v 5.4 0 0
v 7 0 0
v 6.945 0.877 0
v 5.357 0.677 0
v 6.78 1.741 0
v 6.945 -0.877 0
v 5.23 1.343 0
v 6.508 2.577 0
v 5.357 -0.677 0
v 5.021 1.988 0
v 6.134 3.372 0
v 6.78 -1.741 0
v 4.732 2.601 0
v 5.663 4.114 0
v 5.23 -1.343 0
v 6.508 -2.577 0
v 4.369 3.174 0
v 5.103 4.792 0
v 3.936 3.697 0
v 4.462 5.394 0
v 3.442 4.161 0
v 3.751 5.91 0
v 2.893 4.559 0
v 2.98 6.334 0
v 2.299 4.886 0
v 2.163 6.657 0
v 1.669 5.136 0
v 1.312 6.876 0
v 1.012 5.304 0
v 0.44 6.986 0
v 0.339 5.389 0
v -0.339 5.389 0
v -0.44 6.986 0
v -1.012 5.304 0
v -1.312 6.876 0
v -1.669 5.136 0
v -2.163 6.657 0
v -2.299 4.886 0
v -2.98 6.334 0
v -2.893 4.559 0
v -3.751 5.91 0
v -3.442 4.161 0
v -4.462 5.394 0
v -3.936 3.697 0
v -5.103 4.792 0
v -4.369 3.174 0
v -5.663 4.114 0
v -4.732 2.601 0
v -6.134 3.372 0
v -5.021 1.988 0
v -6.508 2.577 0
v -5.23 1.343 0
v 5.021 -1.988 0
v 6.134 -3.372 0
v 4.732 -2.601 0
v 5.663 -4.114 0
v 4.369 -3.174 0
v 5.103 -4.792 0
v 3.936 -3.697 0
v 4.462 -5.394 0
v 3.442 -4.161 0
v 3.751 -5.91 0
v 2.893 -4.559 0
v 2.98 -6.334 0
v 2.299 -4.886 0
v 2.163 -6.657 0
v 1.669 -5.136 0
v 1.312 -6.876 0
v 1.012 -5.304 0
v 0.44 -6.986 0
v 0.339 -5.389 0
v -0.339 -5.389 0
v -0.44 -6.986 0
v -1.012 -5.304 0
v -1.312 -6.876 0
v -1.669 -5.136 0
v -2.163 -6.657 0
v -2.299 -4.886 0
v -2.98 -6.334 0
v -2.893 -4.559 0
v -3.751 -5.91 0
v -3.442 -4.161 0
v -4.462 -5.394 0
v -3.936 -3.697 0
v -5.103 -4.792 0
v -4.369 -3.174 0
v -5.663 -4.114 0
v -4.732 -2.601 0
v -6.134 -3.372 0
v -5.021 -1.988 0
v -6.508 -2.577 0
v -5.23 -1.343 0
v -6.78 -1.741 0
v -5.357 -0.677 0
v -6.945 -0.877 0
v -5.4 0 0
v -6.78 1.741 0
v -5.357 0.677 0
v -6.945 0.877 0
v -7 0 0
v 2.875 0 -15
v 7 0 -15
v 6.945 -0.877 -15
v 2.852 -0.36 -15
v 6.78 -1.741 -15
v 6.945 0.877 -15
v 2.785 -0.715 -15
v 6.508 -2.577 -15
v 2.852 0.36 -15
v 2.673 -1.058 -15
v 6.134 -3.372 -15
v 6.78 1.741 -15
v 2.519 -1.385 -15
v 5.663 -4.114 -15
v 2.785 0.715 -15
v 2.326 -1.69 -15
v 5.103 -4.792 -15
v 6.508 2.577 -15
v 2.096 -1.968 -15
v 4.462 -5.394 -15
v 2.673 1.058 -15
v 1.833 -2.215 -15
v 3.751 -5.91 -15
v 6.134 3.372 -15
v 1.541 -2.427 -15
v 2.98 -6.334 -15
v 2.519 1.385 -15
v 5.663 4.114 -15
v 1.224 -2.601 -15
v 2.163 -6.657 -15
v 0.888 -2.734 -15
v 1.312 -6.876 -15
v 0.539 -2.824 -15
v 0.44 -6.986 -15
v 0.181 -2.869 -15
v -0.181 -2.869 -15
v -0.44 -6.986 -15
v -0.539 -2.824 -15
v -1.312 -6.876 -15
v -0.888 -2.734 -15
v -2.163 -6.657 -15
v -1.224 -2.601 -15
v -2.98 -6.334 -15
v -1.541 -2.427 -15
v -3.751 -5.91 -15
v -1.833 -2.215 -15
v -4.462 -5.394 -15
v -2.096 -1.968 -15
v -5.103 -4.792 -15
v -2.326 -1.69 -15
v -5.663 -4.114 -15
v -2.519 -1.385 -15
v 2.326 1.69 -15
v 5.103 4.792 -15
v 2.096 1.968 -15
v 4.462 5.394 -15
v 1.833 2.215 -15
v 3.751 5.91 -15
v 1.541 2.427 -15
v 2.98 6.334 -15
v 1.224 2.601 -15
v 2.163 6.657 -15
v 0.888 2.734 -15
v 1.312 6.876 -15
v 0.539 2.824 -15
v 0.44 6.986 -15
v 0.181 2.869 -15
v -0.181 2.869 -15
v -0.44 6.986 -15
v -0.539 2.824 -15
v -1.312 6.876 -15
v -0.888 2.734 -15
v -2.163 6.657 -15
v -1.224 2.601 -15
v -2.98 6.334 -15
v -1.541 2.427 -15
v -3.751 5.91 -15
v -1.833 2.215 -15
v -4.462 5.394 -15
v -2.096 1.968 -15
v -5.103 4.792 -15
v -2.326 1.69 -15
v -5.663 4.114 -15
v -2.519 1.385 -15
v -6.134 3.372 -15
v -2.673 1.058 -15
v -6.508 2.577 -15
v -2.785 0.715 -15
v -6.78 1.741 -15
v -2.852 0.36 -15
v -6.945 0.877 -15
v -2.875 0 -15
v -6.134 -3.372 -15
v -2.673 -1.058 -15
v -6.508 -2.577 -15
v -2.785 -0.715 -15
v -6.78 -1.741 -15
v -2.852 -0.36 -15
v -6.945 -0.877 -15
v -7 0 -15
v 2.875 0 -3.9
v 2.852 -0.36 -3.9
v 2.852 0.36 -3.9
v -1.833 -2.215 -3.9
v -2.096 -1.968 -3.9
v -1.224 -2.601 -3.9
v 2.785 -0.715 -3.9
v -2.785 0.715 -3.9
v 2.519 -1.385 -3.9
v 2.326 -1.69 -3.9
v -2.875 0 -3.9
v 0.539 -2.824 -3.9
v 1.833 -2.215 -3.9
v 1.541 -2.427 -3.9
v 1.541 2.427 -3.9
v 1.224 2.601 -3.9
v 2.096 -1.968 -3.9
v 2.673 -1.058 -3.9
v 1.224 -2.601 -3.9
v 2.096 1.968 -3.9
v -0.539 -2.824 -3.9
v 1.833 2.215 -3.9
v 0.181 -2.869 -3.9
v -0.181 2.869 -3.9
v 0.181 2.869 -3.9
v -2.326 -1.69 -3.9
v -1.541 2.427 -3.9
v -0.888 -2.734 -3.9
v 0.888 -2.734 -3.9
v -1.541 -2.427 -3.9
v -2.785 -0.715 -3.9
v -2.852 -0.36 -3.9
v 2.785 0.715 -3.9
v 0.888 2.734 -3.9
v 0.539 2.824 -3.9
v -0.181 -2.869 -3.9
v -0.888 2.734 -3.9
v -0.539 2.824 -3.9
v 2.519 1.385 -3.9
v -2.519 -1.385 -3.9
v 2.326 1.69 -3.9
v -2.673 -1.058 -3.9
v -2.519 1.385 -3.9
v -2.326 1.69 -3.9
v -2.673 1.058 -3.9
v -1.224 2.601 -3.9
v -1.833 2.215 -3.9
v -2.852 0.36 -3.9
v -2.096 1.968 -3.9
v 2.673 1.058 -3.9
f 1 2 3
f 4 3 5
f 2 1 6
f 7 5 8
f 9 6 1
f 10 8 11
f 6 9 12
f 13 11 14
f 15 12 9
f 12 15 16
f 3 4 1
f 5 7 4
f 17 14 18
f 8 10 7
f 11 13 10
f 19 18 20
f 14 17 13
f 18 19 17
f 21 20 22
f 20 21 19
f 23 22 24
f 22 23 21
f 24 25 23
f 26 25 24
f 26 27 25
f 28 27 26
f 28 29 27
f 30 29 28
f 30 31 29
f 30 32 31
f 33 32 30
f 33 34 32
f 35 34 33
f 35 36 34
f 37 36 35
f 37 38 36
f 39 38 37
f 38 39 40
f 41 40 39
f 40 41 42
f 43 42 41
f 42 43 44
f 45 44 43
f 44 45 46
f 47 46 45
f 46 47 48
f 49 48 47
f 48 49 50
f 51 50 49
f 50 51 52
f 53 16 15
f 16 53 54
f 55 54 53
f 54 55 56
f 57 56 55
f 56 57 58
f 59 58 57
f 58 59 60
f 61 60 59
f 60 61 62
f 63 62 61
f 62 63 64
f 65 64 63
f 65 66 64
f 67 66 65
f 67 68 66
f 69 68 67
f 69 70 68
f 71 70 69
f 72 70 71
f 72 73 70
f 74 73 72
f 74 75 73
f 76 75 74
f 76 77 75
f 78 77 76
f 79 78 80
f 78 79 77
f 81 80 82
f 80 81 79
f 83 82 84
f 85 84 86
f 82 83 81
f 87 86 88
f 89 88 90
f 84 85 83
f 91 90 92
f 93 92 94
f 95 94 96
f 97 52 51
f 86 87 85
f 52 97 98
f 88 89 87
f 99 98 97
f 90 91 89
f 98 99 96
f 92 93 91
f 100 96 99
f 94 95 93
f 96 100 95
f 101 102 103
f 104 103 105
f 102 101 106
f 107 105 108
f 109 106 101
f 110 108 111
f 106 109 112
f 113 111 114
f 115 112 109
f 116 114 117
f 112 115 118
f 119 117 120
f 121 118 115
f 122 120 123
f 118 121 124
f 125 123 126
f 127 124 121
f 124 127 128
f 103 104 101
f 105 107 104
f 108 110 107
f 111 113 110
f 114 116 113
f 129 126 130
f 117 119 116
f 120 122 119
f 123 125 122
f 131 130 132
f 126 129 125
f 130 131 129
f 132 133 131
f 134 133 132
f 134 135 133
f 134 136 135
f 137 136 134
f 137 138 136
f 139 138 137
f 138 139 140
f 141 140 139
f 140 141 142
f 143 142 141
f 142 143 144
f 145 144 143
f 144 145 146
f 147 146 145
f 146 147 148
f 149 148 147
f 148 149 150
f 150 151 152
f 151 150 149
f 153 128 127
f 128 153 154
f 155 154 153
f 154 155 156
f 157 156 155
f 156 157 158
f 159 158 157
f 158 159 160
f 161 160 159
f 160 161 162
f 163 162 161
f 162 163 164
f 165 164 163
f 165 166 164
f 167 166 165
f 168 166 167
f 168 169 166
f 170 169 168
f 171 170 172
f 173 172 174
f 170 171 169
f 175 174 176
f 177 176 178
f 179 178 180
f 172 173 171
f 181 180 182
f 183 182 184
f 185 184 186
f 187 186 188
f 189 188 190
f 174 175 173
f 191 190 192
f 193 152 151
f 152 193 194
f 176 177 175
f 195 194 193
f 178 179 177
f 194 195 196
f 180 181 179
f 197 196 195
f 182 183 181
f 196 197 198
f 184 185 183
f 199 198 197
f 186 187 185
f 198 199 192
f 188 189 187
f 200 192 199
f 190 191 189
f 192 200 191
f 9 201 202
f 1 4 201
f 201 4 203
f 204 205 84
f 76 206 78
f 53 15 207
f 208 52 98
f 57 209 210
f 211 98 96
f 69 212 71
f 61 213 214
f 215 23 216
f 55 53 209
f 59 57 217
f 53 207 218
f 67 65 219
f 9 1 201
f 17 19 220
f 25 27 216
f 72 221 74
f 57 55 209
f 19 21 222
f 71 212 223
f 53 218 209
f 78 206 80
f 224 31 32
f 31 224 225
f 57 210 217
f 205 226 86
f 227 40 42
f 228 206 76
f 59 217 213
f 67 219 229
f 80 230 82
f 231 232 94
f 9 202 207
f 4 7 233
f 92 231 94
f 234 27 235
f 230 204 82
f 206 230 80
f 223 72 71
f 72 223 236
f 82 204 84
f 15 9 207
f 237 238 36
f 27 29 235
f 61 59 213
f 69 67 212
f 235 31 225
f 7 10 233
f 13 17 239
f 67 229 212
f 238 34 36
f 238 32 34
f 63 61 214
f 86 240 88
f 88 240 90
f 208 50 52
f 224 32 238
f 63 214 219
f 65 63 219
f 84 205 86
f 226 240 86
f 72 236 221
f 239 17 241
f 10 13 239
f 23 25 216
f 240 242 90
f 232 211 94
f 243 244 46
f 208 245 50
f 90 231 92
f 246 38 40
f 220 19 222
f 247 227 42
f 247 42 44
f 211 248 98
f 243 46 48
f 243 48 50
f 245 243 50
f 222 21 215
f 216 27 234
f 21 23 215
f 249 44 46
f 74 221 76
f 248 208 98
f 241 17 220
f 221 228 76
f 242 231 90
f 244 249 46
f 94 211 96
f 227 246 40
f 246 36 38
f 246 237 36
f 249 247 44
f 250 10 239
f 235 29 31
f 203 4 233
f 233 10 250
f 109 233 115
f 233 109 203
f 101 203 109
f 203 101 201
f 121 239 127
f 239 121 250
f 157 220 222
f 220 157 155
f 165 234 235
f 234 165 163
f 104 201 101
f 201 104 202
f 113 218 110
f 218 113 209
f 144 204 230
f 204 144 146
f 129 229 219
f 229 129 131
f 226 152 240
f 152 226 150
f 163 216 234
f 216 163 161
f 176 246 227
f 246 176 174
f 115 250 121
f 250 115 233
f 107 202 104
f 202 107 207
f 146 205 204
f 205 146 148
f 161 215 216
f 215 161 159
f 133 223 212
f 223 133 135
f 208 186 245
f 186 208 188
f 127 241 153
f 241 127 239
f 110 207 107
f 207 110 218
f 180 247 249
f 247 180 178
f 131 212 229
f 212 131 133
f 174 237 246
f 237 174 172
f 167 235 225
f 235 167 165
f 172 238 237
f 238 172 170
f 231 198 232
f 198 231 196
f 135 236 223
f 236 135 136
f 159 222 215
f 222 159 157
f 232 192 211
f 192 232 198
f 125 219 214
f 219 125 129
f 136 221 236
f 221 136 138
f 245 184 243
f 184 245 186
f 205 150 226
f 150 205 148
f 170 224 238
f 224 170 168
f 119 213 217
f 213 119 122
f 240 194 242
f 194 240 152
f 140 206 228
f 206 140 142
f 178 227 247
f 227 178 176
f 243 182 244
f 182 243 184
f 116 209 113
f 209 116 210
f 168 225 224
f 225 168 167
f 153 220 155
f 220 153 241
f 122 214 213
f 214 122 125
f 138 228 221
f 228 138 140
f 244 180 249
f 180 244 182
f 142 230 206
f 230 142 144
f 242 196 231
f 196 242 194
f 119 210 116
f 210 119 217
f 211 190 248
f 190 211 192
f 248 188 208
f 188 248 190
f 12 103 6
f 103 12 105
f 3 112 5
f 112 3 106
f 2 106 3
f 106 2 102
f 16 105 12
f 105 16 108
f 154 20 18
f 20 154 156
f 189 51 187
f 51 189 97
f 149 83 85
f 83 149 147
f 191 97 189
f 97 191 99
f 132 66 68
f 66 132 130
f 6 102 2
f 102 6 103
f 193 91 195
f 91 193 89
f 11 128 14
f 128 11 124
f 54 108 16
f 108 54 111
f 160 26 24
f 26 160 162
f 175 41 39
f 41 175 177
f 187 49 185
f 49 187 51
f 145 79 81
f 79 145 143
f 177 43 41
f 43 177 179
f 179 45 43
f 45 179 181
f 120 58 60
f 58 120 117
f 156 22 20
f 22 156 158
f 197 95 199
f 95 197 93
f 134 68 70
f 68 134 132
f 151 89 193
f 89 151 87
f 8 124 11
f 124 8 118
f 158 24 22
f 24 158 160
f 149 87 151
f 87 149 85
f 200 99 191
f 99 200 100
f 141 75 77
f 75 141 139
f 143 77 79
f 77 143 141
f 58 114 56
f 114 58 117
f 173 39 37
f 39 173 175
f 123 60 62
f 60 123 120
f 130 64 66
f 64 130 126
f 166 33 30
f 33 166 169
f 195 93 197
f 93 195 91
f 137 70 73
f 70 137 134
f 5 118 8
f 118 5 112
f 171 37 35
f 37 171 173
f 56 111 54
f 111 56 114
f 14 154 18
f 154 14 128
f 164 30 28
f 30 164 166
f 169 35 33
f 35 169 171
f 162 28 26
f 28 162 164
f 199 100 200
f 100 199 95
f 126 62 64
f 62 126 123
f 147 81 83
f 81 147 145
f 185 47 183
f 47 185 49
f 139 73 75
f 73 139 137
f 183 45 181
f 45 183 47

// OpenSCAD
$fn = 50;


difference() {
	union() {
		translate(v = [0, 0, -15.0000000000]) {
			cylinder(h = 15, r = 7.0000000000);
		}
	}
	union() {
		translate(v = [0, 0, 0]) {
			rotate(a = [0, 0, 0]) {
				difference() {
					union() {
						#translate(v = [0, 0, -15.0000000000]) {
							cylinder(h = 15, r = 2.6000000000);
						}
						#translate(v = [0, 0, -3.9000000000]) {
							cylinder(h = 3.9000000000, r1 = 2.8750000000, r2 = 5.4000000000);
						}
						#translate(v = [0, 0, -15.0000000000]) {
							cylinder(h = 15, r = 2.8750000000);
						}
						#translate(v = [0, 0, -15.0000000000]) {
							cylinder(h = 15, r = 2.6000000000);
						}
					}
					union();
				}
			}
		}
	}
}
